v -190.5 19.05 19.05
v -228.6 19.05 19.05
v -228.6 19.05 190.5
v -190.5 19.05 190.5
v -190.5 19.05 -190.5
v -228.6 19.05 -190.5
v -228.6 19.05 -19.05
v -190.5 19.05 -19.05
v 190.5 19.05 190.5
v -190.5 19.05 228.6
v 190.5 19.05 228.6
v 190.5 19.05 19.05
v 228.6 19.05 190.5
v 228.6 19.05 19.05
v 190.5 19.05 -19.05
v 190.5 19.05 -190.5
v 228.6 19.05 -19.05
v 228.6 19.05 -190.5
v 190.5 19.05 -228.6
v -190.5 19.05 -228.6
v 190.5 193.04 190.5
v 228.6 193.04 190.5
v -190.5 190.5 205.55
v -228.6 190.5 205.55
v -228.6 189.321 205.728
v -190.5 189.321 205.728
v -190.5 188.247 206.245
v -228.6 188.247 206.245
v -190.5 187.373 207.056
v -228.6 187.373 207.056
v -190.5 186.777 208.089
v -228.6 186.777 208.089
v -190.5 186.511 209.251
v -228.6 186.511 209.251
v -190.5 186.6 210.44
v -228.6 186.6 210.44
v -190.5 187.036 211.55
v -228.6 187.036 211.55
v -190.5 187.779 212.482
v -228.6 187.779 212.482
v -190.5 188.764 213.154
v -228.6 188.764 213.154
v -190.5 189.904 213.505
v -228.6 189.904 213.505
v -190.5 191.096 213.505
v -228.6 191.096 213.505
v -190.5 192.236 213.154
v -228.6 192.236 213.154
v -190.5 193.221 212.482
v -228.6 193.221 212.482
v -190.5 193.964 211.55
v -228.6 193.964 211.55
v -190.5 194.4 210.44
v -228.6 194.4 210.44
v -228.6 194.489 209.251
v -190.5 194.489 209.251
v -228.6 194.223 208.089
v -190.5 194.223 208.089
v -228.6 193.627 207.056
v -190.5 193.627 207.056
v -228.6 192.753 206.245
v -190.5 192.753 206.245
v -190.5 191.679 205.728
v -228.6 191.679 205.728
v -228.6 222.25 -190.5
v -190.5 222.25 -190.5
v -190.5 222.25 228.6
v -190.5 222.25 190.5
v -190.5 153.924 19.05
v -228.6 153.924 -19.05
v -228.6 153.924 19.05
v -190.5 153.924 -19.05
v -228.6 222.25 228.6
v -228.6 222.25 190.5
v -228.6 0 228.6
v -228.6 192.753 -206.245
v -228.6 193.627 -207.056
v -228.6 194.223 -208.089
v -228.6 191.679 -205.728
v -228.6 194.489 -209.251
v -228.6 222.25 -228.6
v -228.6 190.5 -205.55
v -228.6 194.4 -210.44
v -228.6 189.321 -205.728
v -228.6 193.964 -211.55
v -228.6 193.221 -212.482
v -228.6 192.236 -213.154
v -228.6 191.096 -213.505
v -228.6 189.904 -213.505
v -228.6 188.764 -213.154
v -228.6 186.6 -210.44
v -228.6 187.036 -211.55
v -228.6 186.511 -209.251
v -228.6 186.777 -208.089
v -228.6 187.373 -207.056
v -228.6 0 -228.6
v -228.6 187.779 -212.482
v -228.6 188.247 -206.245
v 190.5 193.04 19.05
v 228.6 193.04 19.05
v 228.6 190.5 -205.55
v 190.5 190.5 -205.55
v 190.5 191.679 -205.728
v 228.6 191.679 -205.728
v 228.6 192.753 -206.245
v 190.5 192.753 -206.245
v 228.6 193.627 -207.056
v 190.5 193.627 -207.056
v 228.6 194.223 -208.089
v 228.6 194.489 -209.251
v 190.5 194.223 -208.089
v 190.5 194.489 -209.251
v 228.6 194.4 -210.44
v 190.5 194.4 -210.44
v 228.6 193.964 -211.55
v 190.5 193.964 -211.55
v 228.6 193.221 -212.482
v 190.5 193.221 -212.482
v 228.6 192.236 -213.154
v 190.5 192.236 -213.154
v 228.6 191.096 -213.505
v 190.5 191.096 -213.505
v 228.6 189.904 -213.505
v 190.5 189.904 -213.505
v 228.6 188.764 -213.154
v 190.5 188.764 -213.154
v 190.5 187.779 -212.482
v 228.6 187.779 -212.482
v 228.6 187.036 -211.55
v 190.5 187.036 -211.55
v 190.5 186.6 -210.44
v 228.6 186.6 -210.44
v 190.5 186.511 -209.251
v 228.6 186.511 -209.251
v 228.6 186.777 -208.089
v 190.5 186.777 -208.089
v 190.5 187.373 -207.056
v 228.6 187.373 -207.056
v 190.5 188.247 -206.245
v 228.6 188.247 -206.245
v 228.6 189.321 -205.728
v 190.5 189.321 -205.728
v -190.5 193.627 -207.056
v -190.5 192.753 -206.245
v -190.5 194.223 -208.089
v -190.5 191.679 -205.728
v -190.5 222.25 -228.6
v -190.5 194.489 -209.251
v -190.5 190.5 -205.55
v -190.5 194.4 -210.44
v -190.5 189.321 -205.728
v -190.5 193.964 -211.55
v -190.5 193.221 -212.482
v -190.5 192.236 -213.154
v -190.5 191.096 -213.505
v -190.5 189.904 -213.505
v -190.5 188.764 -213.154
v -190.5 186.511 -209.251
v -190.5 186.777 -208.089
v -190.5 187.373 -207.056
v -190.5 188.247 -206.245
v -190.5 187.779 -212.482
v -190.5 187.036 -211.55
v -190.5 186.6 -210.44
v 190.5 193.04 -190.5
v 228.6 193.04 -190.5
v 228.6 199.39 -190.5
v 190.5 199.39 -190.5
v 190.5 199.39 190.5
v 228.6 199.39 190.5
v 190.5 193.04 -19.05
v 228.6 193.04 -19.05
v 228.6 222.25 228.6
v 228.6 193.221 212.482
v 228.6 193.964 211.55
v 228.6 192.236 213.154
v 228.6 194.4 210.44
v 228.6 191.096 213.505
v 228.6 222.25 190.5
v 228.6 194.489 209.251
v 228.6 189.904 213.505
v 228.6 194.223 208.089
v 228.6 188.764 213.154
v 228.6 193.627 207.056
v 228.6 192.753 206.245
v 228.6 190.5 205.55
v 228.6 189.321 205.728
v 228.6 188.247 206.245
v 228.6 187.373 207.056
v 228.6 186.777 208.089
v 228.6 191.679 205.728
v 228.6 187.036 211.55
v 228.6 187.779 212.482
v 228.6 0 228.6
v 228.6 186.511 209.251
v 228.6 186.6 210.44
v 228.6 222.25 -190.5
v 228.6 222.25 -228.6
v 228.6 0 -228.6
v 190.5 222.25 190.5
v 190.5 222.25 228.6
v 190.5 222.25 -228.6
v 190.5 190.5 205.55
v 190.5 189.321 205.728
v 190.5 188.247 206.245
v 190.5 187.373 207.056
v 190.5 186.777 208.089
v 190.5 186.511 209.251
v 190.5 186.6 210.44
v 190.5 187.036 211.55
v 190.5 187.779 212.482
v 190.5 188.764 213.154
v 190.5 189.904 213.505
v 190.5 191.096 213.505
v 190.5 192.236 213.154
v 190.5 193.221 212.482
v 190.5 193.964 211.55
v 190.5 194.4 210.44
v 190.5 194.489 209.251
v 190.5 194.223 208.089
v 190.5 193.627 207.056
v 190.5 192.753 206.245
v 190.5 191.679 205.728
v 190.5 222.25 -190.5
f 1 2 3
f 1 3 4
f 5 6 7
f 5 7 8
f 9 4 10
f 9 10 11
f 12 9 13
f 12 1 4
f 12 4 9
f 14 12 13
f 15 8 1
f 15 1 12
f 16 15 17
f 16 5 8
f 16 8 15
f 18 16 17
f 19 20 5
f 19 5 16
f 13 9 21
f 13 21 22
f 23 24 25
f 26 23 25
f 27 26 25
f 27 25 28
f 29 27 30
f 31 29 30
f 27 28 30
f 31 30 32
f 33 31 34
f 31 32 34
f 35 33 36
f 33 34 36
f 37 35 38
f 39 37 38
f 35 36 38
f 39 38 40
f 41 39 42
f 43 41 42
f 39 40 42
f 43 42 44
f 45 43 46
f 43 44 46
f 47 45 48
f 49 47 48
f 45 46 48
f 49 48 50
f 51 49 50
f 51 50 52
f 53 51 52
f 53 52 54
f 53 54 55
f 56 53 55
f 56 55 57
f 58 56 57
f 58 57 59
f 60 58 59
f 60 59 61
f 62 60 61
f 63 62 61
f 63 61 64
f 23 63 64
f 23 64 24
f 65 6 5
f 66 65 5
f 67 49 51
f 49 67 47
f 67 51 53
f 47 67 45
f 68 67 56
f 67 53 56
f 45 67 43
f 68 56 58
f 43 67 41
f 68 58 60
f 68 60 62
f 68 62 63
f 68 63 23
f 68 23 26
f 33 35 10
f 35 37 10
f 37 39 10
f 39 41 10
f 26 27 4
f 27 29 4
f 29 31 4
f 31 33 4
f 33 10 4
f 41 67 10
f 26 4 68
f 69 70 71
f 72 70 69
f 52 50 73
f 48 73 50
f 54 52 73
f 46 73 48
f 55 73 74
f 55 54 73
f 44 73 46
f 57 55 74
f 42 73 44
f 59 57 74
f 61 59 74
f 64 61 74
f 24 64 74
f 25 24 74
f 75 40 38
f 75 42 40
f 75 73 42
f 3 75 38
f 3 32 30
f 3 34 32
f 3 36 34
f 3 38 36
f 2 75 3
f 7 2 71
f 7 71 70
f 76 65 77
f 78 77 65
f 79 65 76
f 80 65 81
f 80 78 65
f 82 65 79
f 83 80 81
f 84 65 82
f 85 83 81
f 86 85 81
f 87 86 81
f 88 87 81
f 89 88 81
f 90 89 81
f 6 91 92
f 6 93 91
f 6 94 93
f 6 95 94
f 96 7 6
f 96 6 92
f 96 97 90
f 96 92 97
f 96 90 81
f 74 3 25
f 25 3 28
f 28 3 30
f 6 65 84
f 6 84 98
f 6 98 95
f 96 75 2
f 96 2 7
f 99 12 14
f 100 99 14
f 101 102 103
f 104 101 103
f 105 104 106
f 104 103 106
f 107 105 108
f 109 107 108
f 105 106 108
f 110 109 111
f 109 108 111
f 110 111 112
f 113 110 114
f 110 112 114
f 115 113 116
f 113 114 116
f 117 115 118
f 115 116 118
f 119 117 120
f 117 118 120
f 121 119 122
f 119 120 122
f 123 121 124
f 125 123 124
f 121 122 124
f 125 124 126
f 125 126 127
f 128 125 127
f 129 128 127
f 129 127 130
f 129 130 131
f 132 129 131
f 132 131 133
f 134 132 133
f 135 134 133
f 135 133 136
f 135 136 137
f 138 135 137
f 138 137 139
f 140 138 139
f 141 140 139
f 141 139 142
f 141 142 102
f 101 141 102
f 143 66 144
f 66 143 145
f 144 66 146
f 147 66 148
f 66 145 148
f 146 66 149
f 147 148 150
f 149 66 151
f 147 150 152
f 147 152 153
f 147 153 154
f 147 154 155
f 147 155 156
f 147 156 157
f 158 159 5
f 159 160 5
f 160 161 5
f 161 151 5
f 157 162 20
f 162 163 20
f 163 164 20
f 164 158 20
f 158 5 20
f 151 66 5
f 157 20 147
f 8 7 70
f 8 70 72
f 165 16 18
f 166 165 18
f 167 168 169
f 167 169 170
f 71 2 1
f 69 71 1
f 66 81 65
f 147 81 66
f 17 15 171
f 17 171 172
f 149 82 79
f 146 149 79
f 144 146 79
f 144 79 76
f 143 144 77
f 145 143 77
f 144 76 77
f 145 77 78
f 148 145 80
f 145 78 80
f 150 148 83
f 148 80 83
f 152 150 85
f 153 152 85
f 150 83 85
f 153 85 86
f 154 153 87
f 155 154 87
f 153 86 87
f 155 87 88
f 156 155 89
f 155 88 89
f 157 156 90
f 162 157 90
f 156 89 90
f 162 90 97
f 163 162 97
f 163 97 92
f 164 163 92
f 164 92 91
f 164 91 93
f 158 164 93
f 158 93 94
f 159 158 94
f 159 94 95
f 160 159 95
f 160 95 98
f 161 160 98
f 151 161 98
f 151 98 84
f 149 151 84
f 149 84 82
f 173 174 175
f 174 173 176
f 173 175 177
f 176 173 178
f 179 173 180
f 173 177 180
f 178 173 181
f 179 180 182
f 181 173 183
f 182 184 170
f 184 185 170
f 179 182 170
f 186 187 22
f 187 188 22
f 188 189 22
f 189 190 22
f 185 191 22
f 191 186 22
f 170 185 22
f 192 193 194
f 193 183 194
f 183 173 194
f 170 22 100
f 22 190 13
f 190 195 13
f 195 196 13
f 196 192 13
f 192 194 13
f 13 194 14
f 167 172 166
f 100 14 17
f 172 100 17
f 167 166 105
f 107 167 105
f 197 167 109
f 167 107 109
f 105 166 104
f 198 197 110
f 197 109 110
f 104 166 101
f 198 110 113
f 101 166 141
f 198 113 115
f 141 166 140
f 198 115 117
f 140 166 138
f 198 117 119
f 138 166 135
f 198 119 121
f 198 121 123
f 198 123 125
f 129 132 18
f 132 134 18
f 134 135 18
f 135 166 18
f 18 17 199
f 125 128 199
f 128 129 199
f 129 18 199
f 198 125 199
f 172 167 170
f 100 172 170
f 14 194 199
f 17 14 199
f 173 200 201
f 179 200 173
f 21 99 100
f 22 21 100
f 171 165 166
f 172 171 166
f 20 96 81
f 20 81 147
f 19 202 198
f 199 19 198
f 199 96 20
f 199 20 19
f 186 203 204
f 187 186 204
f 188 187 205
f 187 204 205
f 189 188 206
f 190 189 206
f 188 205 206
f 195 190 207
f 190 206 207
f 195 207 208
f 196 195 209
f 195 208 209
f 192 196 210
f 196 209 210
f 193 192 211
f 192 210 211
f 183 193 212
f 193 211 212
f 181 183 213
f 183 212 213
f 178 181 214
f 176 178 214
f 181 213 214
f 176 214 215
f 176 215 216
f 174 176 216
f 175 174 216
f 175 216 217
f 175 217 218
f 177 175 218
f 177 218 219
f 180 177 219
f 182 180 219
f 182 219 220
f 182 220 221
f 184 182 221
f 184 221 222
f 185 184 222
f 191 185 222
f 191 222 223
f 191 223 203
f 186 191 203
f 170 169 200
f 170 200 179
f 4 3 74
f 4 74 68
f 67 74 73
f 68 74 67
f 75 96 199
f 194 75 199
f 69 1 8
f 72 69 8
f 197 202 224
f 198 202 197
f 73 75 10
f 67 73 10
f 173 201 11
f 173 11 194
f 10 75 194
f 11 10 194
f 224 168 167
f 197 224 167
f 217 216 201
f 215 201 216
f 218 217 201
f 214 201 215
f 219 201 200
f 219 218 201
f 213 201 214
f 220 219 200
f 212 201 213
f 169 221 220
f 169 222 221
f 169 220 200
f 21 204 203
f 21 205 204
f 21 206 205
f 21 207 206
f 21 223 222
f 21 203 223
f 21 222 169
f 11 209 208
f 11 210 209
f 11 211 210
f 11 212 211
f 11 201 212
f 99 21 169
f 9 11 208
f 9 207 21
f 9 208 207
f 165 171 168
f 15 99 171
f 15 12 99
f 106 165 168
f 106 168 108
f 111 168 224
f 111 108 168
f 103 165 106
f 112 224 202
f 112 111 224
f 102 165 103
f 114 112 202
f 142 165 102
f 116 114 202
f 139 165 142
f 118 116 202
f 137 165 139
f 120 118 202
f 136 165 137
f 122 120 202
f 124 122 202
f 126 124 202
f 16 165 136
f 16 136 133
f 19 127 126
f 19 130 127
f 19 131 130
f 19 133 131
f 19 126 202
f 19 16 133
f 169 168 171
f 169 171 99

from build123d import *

# Parameters (mm, degrees)
SKETCH2_W           = 457.2
SKETCH2_H           = 457.2
BOSS_EXTRUDE1_DEPTH = 19.05
SKETCH3_W           = 38.1
SKETCH3_H           = 38.1
BOSS_EXTRUDE2_DEPTH = 203.2
SKETCH4_R           = 4
CUT_EXTRUDE1_DEPTH  = 457.2
SKETCH6_W           = 38.1
SKETCH6_H           = 38.1
BOSS_EXTRUDE3_DEPTH = 134.874
SKETCH7_W           = 38.1
SKETCH7_H           = 38.1
BOSS_EXTRUDE4_DEPTH = 173.99
SKETCH8_W           = 38.1
SKETCH8_H           = 381
BOSS_EXTRUDE5_DEPTH = 6.35


with BuildPart() as part:
    # Sketch2 → Boss-Extrude1 (new body)
    with BuildSketch(Plane(origin=(0, 0, 0), x_dir=(1, 0, 0), z_dir=(0, 1, 0))):
        Rectangle(SKETCH2_W, SKETCH2_H)
    extrude(amount=BOSS_EXTRUDE1_DEPTH)

    # Sketch3 → Boss-Extrude2 (add)
    with BuildSketch(Plane(origin=(0, 19.05, 0), x_dir=(1, 0, 0), z_dir=(0, 1, 0))):
        with Locations((209.55, 209.55)):
            Rectangle(SKETCH3_W, SKETCH3_H)
        with Locations((-209.55, 209.55)):
            Rectangle(SKETCH3_W, SKETCH3_H)
        with Locations((-209.55, -209.55)):
            Rectangle(SKETCH3_W, SKETCH3_H)
        with Locations((209.55, -209.55)):
            Rectangle(SKETCH3_W, SKETCH3_H)
    extrude(amount=BOSS_EXTRUDE2_DEPTH)

    # Sketch4 → Cut-Extrude1 (cut)
    with BuildSketch(Plane.ZY.offset(228.6)):
        with Locations((-209.55, 190.5)):
            Circle(SKETCH4_R)
        with Locations(Location((209.55, 190.5, 0), (0, 0, 180))):
            Circle(SKETCH4_R)
    extrude(amount=-CUT_EXTRUDE1_DEPTH, mode=Mode.SUBTRACT)

    # Sketch6 → Boss-Extrude3 (add)
    with BuildSketch(Plane(origin=(0, 19.05, 0), x_dir=(1, 0, 0), z_dir=(0, 1, 0))):
        with Locations((-209.55, 0)):
            Rectangle(SKETCH6_W, SKETCH6_H)
    extrude(amount=BOSS_EXTRUDE3_DEPTH)

    # Sketch7 → Boss-Extrude4 (add)
    with BuildSketch(Plane(origin=(0, 19.05, 0), x_dir=(1, 0, 0), z_dir=(0, 1, 0))):
        with Locations((209.55, 0)):
            Rectangle(SKETCH7_W, SKETCH7_H)
    extrude(amount=BOSS_EXTRUDE4_DEPTH)

    # Sketch8 → Boss-Extrude5 (add)
    with BuildSketch(Plane(origin=(0, 193.04, 0), x_dir=(1, 0, 0), z_dir=(0, 1, 0))):
        with Locations((209.55, 0)):
            Rectangle(SKETCH8_W, SKETCH8_H)
    extrude(amount=BOSS_EXTRUDE5_DEPTH)


solid = part.part
